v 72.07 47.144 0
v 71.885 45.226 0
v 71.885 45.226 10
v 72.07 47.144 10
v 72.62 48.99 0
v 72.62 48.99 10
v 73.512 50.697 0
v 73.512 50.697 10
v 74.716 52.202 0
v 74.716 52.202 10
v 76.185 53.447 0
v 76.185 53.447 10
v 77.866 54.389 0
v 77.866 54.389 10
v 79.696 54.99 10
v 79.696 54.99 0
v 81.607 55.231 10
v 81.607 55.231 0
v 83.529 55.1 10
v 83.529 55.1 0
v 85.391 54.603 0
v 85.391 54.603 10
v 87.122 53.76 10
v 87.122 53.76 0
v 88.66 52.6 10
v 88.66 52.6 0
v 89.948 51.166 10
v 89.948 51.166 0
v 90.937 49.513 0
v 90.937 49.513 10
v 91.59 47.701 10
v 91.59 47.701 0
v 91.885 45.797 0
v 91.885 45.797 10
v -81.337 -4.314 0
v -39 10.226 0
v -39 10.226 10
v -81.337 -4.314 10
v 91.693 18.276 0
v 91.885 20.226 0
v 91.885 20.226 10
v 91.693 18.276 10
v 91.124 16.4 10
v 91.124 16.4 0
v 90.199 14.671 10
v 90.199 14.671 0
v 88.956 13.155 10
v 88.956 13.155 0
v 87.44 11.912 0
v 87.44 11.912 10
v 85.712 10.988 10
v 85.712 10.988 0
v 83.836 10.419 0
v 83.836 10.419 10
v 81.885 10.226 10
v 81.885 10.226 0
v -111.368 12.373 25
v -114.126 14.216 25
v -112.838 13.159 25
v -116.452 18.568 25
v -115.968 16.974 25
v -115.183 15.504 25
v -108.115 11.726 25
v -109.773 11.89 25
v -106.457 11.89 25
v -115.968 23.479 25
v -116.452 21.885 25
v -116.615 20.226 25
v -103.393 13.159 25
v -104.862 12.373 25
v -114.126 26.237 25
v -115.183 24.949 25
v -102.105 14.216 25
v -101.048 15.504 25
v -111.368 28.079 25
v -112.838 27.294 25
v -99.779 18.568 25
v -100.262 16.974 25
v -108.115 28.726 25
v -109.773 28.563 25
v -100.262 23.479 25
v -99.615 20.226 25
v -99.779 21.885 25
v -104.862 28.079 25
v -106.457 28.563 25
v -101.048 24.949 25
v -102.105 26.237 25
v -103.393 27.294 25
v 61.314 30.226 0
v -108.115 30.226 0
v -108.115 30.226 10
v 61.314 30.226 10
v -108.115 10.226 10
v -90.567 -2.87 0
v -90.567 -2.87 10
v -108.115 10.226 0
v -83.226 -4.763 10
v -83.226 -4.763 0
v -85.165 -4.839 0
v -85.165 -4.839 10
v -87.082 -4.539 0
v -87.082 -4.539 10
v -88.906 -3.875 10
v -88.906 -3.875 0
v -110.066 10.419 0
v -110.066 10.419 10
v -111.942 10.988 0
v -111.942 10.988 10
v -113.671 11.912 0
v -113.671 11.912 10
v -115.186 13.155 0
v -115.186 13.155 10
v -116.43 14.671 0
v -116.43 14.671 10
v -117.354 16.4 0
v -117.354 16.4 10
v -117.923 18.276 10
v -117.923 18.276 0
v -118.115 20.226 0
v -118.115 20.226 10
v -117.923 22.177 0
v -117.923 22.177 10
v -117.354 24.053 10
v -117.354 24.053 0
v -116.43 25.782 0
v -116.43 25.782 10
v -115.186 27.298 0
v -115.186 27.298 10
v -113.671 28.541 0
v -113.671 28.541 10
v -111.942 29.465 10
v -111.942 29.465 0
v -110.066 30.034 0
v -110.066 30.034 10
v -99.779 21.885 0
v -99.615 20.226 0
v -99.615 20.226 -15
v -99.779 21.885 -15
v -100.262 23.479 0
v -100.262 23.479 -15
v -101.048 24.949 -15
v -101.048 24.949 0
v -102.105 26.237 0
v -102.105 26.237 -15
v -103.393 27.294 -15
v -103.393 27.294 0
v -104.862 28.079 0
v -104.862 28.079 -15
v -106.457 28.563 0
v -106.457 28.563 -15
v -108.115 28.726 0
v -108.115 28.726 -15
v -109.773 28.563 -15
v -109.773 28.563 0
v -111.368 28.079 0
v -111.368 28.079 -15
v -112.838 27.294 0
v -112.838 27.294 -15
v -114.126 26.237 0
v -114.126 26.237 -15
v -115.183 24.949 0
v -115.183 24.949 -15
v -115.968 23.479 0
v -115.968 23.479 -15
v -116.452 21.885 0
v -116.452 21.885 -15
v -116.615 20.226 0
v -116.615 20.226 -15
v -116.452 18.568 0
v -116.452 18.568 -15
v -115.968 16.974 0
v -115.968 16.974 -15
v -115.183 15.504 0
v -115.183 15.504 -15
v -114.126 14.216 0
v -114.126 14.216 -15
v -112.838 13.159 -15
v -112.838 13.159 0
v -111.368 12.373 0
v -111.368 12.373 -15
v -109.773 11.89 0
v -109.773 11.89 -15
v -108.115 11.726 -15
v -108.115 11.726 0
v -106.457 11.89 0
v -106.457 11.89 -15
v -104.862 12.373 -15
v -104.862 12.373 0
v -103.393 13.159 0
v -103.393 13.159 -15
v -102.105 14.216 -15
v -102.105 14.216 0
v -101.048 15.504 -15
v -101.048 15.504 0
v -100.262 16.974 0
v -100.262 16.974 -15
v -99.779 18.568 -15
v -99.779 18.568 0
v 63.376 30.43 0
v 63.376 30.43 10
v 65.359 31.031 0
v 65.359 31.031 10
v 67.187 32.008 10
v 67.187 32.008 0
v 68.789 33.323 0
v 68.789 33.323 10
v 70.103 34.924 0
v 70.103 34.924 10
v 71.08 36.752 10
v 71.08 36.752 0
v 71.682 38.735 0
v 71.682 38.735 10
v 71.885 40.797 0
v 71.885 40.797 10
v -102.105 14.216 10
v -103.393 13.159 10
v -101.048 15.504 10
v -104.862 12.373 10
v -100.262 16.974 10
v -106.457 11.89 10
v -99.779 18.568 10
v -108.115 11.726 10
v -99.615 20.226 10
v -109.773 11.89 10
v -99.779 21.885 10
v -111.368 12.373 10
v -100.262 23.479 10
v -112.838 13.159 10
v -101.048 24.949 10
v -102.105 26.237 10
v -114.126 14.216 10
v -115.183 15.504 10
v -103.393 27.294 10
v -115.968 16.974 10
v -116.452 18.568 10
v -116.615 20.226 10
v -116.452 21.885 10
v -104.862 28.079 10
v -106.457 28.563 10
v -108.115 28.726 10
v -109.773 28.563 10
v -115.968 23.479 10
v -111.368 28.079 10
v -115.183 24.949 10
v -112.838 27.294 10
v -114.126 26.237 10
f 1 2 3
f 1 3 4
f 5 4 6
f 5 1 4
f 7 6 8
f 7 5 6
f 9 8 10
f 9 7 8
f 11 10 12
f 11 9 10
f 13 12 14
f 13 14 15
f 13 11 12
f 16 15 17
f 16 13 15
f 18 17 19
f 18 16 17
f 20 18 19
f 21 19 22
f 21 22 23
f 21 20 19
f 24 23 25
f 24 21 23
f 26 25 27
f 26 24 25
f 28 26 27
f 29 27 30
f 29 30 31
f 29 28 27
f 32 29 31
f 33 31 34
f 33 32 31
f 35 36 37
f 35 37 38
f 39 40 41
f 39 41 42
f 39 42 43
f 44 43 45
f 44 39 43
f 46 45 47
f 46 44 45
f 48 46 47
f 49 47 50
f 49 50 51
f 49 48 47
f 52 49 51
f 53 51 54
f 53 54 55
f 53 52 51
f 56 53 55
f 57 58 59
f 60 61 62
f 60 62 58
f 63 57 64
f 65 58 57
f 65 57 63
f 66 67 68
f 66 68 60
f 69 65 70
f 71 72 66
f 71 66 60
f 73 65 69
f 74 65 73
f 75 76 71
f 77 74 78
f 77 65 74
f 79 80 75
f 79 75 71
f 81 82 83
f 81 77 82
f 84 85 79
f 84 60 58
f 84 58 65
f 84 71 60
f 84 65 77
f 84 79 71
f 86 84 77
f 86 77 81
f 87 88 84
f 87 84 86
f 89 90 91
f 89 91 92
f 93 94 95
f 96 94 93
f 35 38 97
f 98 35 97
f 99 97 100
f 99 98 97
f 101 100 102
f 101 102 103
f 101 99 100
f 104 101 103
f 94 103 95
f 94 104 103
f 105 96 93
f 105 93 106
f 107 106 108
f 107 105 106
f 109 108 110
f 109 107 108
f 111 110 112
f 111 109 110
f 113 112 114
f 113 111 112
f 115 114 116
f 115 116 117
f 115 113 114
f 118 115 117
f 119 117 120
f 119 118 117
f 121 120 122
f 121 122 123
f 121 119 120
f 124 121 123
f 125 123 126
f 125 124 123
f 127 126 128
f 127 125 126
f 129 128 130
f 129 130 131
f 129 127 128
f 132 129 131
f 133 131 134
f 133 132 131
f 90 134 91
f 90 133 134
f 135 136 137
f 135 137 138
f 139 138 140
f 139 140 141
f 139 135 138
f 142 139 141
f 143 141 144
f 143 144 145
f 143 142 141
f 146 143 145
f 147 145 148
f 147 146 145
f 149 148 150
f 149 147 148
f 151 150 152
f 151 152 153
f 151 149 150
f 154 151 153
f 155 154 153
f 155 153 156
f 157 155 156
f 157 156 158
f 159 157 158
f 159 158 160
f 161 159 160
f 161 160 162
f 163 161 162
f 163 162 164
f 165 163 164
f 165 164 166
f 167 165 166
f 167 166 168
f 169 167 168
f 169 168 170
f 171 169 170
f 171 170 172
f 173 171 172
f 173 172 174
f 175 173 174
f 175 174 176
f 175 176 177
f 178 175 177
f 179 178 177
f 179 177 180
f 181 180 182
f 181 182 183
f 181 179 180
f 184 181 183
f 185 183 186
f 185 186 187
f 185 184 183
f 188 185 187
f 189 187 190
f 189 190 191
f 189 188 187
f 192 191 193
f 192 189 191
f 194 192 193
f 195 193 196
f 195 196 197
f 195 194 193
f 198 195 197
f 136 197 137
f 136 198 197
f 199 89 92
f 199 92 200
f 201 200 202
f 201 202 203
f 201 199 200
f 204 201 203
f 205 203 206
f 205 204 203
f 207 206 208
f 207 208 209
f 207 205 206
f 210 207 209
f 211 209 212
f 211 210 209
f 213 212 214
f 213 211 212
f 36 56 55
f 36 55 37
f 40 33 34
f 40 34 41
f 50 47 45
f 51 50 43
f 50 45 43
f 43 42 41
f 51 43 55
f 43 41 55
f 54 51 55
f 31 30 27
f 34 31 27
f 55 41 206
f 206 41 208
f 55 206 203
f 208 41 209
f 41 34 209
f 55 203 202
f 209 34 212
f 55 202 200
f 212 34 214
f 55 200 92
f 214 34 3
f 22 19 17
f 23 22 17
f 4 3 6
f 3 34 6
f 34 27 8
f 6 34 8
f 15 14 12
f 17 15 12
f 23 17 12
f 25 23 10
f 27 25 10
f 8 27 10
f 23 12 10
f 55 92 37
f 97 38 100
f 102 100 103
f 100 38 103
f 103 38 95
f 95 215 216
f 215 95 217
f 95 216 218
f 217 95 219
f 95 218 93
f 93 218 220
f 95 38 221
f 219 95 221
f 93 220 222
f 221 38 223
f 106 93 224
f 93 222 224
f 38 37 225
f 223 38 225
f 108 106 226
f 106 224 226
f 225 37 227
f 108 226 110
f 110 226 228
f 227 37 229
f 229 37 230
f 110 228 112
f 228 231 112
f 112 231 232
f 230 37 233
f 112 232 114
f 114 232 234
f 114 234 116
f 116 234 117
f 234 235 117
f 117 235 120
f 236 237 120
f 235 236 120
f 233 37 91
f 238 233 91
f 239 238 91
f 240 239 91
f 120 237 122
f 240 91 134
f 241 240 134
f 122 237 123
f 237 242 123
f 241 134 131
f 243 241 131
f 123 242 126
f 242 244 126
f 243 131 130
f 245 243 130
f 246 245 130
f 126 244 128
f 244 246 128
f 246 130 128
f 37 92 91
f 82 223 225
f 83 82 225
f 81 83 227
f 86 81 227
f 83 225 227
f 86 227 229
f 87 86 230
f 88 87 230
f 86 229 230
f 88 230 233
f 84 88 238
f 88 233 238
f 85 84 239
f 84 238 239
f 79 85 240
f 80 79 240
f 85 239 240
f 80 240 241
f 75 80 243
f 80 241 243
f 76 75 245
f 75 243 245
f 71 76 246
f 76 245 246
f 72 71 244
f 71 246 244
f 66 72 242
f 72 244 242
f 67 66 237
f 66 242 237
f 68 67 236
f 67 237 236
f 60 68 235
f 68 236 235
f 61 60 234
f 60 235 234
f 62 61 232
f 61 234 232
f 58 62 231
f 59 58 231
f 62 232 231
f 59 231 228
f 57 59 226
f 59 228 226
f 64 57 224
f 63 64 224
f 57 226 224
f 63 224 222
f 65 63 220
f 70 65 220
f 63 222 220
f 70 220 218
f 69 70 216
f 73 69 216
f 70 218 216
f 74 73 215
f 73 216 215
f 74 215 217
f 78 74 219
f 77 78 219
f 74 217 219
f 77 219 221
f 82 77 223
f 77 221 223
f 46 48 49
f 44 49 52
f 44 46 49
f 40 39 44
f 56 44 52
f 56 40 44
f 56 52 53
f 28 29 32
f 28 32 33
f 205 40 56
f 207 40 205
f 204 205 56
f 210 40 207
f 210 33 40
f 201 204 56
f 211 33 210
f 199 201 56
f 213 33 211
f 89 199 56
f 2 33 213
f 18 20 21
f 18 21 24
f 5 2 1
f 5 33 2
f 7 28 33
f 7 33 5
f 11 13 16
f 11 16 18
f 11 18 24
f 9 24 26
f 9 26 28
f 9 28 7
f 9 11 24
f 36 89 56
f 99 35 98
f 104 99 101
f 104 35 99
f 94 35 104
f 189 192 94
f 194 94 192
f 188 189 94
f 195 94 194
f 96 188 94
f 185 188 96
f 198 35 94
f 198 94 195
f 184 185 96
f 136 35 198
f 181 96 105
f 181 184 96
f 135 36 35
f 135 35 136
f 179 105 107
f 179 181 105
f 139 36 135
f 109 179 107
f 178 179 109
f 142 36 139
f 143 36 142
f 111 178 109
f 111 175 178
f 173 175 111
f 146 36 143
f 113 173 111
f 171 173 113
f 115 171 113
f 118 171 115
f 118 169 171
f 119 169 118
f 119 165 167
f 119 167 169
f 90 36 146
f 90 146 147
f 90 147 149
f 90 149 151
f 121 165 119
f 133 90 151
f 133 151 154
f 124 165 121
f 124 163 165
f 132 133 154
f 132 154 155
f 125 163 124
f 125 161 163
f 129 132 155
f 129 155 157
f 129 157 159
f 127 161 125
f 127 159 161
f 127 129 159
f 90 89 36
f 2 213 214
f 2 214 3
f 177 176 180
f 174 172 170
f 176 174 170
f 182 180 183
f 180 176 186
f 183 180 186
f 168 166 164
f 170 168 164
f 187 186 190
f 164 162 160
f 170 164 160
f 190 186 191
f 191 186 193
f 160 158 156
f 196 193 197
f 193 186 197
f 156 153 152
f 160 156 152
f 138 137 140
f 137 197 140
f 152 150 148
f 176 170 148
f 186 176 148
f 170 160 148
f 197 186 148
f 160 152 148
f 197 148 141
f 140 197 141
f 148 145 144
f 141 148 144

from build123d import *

# Parameters (mm, degrees)
BOSS_EXTRU_1_DEPTH      = 10
ESQUISSE2_R             = 8.5
BOSS_EXTRU_2_DEPTH      = 15
BOSS_EXTRU_2_DEPTH_BACK = 25


with BuildPart() as part:
    # Esquisse1 → Boss.-Extru.1 (new body)
    with BuildSketch(Plane.XY):
        with BuildLine():
            Line((-38.999653337, 10.226454502), (-81.337427048, -4.313992939))
            ThreePointArc((-81.337427048, -4.313992939), (-86.130996021, -4.736088564), (-90.566704705, -2.870356351))
            Line((-90.566704705, -2.870356351), (-108.115218138, 10.226454502))
            ThreePointArc((-108.115218138, 10.226454502), (-118.115218138, 20.226454502), (-108.115218138, 30.226454502))
            Line((-108.115218138, 30.226454502), (61.31386316, 30.226454502))
            ThreePointArc((61.31386316, 30.226454502), (68.788631458, 33.322604906), (71.884781862, 40.797373204))
            Line((71.884781862, 40.797373204), (71.884781862, 45.226454502))
            ThreePointArc((71.884781862, 45.226454502), (81.607354933, 55.230528024), (91.884781862, 45.797373204))
            Line((91.884781862, 45.797373204), (91.884781862, 20.226454502))
            ThreePointArc((91.884781862, 20.226454502), (88.955849674, 13.15538669), (81.884781862, 10.226454502))
            Line((81.884781862, 10.226454502), (-38.999653337, 10.226454502))
        make_face()
    extrude(amount=BOSS_EXTRU_1_DEPTH)

    # Esquisse2 → Boss.-Extru.2 (add, two sides)
    with BuildSketch(Plane.XY.offset(10)) as boss_extru_2_sk:
        with Locations((-108.115218138, 20.226454502)):
            Circle(ESQUISSE2_R)
    extrude(amount=BOSS_EXTRU_2_DEPTH)
    extrude(boss_extru_2_sk.sketch, amount=-BOSS_EXTRU_2_DEPTH_BACK)


solid = part.part
